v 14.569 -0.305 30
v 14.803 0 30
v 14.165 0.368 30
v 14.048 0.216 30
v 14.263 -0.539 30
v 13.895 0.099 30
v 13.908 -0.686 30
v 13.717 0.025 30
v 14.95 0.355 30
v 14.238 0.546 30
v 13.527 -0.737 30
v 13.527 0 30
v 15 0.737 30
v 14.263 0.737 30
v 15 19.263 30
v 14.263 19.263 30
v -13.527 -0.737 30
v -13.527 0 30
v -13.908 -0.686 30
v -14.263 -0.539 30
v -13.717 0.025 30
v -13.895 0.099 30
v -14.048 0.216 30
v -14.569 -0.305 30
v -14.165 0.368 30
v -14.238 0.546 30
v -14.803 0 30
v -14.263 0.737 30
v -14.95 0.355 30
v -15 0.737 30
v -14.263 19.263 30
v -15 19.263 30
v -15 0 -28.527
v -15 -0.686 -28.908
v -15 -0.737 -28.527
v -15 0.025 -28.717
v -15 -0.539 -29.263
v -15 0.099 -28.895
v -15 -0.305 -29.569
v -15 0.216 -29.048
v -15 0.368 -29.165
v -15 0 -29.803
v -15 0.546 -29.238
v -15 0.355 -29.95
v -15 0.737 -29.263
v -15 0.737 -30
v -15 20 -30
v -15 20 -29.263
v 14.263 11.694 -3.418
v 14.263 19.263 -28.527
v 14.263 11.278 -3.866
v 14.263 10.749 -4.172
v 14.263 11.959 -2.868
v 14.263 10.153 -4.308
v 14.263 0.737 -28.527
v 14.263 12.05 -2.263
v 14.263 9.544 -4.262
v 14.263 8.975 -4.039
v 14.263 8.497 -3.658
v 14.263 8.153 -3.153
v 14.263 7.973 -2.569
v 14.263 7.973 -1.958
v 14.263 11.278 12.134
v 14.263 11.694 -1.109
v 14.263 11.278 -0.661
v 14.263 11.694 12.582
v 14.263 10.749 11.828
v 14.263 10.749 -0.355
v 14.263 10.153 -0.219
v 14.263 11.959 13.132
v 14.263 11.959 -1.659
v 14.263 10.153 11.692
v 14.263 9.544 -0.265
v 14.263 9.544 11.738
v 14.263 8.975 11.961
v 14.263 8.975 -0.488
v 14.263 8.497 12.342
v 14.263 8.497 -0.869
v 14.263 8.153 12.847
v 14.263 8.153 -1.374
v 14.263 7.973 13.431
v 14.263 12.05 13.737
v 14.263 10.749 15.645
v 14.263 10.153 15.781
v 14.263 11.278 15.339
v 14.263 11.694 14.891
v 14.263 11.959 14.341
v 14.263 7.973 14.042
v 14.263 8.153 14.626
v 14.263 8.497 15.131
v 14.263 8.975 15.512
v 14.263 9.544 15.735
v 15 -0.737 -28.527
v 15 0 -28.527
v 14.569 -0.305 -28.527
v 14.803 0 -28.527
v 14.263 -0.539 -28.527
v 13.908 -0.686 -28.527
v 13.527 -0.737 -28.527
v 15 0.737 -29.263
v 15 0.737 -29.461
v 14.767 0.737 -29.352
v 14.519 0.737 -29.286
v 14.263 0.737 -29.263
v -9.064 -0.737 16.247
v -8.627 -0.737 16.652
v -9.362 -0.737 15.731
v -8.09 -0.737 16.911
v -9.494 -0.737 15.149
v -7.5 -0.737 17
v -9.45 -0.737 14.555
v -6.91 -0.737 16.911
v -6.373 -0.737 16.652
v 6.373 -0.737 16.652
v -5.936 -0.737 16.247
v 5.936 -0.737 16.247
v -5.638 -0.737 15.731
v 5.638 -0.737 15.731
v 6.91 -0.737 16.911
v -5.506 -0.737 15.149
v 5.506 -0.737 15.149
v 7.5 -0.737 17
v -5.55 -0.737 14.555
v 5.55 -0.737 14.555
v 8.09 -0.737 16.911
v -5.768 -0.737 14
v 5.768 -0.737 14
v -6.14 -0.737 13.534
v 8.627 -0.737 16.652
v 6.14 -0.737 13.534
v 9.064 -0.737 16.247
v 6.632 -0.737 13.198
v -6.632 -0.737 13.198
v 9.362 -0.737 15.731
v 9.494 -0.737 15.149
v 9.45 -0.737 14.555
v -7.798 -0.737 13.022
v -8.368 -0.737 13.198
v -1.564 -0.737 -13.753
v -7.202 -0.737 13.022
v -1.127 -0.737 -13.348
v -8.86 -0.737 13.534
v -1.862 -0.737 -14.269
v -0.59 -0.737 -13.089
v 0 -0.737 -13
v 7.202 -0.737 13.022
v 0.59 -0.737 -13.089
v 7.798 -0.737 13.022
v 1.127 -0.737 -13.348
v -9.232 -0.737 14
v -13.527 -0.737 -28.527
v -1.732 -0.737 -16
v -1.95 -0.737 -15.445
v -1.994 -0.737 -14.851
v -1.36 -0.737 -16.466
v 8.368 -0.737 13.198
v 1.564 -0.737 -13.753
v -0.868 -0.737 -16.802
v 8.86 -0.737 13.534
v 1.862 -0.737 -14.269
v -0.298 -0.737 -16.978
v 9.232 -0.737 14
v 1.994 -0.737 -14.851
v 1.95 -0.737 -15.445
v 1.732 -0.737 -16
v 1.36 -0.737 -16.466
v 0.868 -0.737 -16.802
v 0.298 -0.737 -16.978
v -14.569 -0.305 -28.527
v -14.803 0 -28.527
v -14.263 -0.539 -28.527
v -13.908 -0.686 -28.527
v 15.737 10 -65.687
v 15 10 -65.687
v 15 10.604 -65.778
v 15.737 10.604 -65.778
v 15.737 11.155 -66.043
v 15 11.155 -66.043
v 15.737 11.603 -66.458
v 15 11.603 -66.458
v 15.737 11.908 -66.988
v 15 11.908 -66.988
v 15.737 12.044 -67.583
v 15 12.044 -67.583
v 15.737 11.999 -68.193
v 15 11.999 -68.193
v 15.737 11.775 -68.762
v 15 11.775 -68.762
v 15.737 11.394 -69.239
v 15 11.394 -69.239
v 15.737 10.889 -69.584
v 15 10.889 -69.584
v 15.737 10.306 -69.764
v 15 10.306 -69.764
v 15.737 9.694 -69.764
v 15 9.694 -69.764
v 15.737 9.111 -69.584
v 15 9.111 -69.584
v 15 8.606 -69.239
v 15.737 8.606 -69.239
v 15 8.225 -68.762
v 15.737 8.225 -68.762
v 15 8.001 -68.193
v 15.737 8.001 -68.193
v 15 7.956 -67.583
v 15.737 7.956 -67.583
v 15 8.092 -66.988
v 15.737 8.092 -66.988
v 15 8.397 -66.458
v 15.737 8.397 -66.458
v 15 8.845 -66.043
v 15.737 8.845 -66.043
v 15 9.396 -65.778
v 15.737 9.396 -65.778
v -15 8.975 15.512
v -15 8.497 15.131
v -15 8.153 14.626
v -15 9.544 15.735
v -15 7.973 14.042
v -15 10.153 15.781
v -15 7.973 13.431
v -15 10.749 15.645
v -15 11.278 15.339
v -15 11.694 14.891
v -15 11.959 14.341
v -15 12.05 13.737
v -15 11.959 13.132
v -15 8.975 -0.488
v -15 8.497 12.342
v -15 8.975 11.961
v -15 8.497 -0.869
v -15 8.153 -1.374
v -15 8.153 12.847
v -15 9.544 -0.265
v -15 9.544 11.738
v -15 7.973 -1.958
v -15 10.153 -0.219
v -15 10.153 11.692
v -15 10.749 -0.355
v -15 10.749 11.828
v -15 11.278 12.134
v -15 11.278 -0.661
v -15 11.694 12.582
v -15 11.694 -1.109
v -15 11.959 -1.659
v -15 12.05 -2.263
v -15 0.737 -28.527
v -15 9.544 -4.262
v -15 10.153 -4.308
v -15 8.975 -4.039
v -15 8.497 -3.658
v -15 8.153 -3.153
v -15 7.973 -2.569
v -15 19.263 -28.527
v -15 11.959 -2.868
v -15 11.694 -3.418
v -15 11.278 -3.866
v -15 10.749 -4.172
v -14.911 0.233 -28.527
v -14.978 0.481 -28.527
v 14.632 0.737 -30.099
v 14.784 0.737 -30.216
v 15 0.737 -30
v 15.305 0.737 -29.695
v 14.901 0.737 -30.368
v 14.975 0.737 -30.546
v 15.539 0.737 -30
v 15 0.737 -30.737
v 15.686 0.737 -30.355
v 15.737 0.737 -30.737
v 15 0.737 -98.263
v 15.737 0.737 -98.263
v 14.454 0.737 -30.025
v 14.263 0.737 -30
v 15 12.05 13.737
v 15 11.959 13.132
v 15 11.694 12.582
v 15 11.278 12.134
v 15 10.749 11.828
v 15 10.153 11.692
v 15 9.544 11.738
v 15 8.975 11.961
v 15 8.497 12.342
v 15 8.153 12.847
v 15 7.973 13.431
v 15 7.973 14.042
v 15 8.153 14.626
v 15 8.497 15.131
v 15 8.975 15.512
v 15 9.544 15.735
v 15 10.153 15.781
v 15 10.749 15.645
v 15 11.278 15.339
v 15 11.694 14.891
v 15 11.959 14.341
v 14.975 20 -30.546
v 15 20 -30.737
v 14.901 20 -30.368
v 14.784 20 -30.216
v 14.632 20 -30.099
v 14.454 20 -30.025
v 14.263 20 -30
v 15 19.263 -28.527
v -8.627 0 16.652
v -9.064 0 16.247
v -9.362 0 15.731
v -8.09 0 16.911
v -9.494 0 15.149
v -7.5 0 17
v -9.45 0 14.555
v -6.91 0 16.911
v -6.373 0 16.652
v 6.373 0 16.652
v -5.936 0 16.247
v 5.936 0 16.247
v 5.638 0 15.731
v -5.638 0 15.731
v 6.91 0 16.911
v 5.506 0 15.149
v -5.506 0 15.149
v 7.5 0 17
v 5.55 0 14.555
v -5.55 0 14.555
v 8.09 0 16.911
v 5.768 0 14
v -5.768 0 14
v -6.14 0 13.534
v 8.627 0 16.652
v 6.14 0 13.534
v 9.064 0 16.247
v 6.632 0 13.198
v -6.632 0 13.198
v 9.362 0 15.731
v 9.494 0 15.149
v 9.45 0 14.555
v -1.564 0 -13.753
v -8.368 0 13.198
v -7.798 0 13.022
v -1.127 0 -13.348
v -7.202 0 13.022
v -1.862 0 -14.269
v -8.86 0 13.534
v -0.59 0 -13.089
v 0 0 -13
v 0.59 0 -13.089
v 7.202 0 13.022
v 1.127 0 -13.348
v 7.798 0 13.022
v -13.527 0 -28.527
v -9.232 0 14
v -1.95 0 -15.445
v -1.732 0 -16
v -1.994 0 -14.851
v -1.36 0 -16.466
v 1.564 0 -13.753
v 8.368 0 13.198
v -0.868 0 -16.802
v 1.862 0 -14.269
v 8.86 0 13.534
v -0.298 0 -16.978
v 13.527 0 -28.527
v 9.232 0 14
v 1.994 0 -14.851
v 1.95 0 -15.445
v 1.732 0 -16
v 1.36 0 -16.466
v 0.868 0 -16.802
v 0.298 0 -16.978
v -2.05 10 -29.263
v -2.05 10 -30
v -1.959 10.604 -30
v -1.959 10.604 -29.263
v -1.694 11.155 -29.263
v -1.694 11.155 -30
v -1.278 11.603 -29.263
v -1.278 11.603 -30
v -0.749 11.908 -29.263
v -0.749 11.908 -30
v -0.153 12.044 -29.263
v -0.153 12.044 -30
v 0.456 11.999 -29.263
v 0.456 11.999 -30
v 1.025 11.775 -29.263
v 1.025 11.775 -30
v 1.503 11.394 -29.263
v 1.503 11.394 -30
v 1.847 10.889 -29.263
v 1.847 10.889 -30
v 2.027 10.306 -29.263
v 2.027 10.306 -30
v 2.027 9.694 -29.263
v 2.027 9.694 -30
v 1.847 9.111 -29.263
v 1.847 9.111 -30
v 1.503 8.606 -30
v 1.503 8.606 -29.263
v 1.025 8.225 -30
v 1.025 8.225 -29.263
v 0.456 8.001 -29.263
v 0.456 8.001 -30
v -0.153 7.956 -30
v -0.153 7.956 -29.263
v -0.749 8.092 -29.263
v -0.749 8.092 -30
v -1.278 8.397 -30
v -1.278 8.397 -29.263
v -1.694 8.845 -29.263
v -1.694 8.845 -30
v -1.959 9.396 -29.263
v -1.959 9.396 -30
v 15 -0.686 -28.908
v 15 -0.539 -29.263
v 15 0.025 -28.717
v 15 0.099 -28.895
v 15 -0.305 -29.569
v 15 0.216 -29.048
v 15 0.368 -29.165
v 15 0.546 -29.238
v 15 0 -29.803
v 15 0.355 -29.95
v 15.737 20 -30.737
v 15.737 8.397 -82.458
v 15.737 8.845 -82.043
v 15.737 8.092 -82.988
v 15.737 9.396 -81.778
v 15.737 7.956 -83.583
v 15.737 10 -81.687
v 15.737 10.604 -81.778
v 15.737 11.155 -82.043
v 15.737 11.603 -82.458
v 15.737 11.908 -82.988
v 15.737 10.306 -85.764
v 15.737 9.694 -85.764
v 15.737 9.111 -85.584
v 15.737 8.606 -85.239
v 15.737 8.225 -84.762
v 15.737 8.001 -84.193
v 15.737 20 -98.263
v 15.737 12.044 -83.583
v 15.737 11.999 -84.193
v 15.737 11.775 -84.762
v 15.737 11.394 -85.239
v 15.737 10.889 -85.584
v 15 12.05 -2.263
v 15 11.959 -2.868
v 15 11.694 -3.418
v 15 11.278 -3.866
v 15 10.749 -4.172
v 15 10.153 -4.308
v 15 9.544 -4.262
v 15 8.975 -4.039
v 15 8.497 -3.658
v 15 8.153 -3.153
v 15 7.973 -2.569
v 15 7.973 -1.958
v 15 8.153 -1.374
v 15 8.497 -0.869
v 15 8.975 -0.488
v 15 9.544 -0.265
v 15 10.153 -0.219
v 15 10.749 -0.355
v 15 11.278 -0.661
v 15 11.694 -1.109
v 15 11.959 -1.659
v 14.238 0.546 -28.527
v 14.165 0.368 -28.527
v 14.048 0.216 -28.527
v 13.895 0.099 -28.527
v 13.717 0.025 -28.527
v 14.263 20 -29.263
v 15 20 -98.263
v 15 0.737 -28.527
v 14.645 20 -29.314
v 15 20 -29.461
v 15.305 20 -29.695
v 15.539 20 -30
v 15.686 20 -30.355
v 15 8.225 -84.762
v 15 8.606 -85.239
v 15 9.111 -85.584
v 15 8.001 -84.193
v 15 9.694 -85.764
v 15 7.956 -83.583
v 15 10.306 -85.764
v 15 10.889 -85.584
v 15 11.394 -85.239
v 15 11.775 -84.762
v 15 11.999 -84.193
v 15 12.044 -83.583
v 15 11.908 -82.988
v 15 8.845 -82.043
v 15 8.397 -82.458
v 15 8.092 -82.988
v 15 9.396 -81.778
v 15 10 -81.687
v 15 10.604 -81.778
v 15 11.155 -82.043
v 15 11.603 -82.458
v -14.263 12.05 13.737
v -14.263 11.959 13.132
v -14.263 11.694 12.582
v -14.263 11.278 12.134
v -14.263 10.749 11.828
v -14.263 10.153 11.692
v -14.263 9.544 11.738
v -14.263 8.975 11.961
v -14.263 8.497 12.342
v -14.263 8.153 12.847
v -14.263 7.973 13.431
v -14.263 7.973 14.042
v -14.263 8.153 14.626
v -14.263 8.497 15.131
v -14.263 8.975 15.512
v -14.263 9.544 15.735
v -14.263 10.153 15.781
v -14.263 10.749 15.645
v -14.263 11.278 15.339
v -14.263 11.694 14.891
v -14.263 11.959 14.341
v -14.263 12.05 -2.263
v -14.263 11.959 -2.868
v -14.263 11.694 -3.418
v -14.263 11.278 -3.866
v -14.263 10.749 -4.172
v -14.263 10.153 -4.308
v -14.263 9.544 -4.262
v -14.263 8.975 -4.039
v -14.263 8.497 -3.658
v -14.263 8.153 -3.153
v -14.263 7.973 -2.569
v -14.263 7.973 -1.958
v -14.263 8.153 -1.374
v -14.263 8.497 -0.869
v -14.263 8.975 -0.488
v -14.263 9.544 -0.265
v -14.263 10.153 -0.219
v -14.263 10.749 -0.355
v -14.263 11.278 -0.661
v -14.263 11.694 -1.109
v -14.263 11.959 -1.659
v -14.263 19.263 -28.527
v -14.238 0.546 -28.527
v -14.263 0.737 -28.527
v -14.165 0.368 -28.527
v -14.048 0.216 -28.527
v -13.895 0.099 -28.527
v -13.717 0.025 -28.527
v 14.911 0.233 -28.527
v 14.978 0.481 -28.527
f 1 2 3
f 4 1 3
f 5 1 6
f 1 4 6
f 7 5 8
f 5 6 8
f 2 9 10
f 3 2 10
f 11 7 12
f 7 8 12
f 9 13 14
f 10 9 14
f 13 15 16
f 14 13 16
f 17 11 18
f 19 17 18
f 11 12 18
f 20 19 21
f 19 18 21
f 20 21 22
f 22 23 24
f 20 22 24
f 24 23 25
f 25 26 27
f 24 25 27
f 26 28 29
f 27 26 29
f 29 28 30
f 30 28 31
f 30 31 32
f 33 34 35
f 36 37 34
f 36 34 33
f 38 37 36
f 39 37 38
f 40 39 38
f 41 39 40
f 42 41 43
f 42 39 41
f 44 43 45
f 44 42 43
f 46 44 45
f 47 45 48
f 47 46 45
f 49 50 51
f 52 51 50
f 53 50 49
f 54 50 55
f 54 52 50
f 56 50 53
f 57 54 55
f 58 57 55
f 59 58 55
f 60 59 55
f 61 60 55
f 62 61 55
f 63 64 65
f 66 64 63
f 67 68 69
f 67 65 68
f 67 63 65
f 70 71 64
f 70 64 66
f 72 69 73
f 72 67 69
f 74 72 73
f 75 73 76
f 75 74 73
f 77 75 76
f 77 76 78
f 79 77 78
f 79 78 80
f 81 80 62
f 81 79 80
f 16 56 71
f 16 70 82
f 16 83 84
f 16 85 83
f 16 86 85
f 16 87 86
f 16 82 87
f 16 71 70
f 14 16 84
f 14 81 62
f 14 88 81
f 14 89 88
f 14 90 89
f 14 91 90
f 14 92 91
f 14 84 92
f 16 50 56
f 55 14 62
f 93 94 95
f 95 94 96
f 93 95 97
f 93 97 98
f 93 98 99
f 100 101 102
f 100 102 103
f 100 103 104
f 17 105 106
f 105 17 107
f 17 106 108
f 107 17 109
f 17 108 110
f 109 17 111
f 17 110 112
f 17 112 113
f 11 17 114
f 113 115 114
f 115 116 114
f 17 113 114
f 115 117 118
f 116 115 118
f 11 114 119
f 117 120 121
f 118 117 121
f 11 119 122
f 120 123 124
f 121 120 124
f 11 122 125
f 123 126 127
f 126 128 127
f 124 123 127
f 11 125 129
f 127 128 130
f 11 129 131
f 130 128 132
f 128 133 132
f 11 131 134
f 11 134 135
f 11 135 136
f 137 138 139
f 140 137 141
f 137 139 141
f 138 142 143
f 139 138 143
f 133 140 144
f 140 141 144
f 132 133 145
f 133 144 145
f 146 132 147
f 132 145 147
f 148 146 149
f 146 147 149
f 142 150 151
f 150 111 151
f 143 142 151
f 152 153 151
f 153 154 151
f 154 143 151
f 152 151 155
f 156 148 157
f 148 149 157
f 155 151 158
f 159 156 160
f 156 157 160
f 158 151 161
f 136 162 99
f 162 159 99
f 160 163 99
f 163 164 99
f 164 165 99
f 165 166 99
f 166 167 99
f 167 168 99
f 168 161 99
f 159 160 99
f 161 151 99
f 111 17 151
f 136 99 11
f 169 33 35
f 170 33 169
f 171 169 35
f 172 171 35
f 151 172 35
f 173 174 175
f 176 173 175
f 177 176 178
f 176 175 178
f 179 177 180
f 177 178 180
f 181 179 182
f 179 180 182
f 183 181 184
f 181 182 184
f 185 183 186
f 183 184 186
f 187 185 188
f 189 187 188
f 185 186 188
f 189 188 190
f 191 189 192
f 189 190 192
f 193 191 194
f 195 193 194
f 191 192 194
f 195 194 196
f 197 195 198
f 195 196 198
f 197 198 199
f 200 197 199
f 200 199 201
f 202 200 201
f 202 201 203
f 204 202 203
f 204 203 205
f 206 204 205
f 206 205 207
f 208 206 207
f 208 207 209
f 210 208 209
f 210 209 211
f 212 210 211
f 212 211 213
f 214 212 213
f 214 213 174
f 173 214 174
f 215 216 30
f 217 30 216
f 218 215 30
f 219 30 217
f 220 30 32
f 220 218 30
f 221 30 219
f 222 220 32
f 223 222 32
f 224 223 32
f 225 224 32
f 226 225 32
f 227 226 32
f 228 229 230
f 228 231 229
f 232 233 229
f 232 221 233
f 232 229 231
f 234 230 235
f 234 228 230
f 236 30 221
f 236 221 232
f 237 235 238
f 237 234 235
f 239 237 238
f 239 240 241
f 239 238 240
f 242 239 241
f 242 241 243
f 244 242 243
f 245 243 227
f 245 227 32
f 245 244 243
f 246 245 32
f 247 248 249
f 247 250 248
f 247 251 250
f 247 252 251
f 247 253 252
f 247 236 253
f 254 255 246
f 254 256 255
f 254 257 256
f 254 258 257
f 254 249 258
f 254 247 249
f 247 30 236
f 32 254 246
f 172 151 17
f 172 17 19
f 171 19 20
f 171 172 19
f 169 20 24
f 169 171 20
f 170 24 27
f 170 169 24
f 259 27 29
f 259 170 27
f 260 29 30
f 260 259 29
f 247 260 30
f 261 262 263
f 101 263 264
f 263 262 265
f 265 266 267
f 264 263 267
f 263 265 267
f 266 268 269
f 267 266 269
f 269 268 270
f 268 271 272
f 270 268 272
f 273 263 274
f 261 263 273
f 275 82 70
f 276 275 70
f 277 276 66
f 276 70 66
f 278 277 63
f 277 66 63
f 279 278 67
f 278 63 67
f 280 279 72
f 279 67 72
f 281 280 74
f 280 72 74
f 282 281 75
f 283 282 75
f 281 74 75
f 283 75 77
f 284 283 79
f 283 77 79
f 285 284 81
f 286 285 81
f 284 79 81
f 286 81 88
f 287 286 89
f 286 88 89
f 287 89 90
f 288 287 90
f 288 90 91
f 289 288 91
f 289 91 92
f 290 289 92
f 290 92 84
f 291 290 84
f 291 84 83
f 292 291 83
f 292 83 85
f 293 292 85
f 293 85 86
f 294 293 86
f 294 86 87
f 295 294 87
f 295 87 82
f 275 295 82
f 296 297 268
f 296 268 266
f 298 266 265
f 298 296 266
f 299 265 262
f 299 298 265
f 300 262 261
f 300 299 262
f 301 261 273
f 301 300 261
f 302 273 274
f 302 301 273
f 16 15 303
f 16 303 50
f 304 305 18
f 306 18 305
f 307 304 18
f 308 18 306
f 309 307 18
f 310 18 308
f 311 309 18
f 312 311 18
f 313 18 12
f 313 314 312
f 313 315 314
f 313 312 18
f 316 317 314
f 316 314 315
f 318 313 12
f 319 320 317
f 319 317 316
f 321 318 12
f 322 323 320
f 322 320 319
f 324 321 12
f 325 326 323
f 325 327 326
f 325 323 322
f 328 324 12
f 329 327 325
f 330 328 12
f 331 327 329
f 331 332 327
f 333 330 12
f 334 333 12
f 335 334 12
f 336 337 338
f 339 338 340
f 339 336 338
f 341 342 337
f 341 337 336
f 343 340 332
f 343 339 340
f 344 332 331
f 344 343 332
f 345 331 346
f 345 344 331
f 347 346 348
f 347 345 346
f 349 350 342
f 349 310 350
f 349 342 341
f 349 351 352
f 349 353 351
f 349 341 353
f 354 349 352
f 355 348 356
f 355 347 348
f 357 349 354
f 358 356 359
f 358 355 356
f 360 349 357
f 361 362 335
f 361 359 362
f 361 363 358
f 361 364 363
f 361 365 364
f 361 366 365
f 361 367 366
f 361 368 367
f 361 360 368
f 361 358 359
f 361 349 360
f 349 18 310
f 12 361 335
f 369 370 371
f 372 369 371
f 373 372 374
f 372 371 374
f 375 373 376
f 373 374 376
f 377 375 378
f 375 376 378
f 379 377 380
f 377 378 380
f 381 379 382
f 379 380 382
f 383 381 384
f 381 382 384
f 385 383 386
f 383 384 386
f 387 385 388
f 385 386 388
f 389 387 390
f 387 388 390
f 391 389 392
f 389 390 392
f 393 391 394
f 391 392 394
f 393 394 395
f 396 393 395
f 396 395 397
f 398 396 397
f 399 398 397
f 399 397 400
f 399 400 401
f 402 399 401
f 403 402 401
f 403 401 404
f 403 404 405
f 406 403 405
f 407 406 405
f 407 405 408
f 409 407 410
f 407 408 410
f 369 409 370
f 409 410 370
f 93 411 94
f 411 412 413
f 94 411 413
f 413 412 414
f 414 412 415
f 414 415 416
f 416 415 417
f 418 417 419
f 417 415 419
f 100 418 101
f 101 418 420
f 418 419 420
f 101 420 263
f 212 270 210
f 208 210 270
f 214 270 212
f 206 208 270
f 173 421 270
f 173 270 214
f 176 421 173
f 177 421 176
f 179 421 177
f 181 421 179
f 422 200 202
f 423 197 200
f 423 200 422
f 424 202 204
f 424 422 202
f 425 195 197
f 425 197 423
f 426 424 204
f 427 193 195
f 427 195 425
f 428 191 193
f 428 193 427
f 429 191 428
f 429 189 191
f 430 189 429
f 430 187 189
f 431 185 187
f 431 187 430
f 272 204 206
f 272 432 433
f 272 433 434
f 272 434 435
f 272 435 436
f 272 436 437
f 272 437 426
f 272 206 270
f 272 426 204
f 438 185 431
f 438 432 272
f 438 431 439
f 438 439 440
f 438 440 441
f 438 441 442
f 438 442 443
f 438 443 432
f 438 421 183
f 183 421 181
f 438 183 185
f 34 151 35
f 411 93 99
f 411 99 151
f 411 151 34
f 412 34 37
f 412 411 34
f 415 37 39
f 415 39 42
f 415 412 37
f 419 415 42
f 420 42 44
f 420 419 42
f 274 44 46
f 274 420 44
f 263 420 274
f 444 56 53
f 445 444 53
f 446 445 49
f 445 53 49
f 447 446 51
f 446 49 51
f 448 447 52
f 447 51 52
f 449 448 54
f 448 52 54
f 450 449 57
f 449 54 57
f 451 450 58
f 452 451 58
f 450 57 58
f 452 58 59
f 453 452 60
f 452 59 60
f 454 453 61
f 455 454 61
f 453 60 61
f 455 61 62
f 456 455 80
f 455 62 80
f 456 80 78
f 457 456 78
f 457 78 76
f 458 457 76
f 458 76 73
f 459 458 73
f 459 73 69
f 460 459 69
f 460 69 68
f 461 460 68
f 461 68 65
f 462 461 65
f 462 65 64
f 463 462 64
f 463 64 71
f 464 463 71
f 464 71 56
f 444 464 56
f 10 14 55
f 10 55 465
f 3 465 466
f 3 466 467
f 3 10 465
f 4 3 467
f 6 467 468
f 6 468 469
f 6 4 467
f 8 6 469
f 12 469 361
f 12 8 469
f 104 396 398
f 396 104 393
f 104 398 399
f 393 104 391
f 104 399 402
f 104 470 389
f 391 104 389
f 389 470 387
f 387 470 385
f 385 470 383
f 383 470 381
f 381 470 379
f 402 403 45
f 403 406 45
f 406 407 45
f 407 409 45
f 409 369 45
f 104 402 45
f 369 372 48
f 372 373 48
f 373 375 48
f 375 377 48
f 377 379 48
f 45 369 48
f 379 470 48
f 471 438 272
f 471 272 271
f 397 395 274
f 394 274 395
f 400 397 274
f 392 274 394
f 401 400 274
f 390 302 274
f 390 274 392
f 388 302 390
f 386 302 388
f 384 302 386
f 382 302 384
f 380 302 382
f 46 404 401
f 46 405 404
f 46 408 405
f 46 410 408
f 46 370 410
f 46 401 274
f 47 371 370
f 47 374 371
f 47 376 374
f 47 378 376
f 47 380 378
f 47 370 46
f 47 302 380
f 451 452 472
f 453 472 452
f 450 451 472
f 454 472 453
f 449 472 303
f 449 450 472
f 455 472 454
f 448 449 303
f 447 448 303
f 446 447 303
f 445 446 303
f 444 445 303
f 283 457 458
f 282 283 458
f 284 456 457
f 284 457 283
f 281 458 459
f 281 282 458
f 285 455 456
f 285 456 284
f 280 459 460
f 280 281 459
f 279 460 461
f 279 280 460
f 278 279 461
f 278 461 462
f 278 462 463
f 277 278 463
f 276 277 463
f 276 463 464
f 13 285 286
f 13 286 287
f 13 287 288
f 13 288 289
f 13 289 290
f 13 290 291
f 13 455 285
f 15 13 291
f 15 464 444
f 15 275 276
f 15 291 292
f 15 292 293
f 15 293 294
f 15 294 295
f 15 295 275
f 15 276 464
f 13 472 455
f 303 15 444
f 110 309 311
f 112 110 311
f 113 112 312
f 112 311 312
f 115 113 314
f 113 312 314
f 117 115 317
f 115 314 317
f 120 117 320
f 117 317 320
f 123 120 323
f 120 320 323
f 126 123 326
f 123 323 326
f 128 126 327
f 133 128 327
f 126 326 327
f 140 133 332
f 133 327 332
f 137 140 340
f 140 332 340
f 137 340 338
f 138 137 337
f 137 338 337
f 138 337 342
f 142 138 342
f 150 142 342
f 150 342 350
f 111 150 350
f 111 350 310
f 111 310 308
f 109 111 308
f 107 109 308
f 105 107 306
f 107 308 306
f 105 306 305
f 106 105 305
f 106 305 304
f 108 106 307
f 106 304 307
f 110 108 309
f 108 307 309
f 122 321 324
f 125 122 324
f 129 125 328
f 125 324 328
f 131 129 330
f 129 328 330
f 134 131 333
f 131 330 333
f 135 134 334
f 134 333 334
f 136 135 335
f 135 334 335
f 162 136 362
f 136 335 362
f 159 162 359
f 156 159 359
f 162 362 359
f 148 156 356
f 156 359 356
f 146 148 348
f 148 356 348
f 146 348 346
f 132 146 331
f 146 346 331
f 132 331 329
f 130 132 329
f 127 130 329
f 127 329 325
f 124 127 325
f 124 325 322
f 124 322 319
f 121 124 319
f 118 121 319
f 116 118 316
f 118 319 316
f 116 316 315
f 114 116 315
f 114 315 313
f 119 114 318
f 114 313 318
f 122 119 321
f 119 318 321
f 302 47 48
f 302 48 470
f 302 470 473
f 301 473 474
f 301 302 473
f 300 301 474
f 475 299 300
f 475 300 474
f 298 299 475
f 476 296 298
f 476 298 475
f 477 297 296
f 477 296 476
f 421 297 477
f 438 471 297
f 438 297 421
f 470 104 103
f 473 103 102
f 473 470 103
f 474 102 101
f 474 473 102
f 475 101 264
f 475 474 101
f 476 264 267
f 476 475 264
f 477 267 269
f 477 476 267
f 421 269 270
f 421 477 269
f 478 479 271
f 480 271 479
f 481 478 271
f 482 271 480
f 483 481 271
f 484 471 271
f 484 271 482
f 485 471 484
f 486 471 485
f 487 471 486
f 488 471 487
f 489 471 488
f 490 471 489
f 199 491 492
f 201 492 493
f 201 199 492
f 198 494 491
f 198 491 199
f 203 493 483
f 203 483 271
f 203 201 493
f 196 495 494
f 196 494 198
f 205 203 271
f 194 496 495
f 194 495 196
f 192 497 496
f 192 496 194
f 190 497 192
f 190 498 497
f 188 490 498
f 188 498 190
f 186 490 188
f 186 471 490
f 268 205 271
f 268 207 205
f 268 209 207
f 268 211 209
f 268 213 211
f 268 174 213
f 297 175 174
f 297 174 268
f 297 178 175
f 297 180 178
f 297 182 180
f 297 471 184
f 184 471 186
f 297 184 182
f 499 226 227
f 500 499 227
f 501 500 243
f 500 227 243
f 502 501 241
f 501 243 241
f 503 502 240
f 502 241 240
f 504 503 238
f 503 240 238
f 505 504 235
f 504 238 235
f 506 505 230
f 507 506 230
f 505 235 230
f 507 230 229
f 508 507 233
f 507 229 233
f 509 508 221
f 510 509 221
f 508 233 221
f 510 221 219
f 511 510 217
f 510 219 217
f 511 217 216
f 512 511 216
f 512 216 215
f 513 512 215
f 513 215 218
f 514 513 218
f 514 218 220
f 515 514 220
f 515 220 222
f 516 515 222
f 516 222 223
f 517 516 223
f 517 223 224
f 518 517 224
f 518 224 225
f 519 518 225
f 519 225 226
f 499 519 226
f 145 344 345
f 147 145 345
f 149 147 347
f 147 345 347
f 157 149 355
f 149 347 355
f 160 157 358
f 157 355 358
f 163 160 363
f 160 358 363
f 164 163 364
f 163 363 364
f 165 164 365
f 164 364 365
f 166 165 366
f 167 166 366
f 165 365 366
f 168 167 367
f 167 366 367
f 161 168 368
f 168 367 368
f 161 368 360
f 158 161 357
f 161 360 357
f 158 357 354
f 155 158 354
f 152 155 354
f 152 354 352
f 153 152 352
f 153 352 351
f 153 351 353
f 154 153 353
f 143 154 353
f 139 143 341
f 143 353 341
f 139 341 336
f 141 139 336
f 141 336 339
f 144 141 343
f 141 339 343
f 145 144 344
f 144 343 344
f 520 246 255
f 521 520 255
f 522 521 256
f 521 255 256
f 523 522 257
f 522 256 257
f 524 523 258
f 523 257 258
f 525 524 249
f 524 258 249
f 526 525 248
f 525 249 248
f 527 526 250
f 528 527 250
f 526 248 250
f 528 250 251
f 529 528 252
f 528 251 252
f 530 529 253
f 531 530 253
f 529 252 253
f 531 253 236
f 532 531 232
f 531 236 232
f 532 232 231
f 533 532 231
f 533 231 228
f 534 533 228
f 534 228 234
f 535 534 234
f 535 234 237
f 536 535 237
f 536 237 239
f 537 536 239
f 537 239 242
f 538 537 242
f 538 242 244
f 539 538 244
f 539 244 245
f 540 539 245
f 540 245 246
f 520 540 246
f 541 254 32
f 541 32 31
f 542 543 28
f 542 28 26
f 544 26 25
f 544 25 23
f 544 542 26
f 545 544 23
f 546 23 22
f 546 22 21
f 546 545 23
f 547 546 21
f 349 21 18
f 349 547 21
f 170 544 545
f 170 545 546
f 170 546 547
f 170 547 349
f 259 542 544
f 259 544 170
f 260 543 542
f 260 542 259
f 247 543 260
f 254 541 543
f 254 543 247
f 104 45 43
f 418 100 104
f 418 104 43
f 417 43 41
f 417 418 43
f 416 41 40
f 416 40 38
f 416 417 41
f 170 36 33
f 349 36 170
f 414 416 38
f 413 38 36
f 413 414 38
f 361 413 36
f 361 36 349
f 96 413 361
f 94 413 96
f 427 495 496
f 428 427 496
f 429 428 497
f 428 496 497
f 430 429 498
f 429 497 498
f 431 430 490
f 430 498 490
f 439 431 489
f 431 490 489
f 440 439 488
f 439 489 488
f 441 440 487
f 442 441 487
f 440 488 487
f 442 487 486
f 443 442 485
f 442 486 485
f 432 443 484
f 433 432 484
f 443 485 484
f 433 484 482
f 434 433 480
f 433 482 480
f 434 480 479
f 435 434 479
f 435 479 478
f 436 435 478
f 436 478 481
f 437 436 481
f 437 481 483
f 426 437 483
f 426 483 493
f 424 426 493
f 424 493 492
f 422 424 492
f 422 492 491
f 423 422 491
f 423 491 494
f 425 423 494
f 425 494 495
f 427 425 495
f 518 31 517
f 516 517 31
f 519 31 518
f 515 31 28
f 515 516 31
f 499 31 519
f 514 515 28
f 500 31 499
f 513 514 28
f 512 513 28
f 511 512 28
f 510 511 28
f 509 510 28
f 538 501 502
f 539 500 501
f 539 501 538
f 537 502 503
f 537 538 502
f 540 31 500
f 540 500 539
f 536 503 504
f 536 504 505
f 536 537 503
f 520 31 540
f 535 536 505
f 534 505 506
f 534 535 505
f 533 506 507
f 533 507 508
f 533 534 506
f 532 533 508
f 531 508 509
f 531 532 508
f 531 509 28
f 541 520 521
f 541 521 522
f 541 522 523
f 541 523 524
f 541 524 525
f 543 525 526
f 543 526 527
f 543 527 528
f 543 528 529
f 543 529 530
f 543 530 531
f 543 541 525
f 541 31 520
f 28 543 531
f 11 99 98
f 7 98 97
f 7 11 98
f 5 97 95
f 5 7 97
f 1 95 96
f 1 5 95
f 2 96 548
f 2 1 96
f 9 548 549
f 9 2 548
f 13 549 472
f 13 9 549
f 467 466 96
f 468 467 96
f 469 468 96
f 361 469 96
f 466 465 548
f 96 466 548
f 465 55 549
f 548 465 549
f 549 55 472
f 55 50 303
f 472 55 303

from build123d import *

# Parameters (mm, degrees)
SKETCH1_W                    = 30
SKETCH1_H                    = 60
SKETCH1_R                    = 2
BASE_FLANGE1_DEPTH           = 0.7366
EDGE_FLANGE1_STRIP_W         = 4.4196
EDGE_FLANGE1_STRIP_H         = 0.7366
EDGE_FLANGE1_STRIP_CUT_DEPTH = 30
EDGE_FLANGE1_DEPTH           = 30
EDGE_FLANGE1_PROFILE_W       = 30
EDGE_FLANGE1_PROFILE_H       = 19.2634
EDGE_FLANGE1_PROFILE_R       = 2.05
EDGE_FLANGE1_FLAT_DEPTH      = 0.7366
EDGE_FLANGE2_STRIP_W         = 4.4196
EDGE_FLANGE2_STRIP_H         = 0.7366
EDGE_FLANGE2_STRIP_CUT_DEPTH = 58.5268
EDGE_FLANGE2_DEPTH           = 58.5268
EDGE_FLANGE3_STRIP_W         = 4.4196
EDGE_FLANGE3_STRIP_H         = 0.7366
EDGE_FLANGE3_STRIP_CUT_DEPTH = 58.5268
EDGE_FLANGE3_DEPTH           = 58.5268
EDGE_FLANGE4_STRIP_W         = 4.4196
EDGE_FLANGE4_STRIP_H         = 0.7366
EDGE_FLANGE4_STRIP_CUT_DEPTH = 19.2634
EDGE_FLANGE4_DEPTH           = 19.2634
SKETCH18_R                   = 2.05
CUT_EXTRUDE1_DEPTH           = 409.590672417


# Sheet-metal steps are written as plain solids
with BuildPart() as part:
    # Sketch1 → Base-Flange1 (new body)
    with BuildSketch(Plane(origin=(0, 0, 0), x_dir=(1, 0, 0), z_dir=(0, 1, 0))):
        Rectangle(SKETCH1_W, SKETCH1_H)
        with Locations(Location((7.5, -15, 0), (0, 0, 270))):
            Circle(SKETCH1_R, mode=Mode.SUBTRACT)
        with Locations(Location((0, 15, 0), (0, 0, 270))):
            Circle(SKETCH1_R, mode=Mode.SUBTRACT)
        with Locations(Location((-7.5, -15, 0), (0, 0, 270))):
            Circle(SKETCH1_R, mode=Mode.SUBTRACT)
    extrude(amount=-BASE_FLANGE1_DEPTH)

    # Edge-Flange1 strip (across the edge) → Edge-Flange1 strip cut (cut)
    with BuildSketch(Plane(origin=(15, 0, -30), x_dir=(0, 0, 1), z_dir=(-1, 0, 0))):
        with Locations((-0.7366, -0.3683)):
            Rectangle(EDGE_FLANGE1_STRIP_W, EDGE_FLANGE1_STRIP_H)
    extrude(amount=EDGE_FLANGE1_STRIP_CUT_DEPTH, mode=Mode.SUBTRACT)

    # Edge-Flange1 bend section (across the edge) → Edge-Flange1 (add)
    with BuildSketch(Plane(origin=(15, 0, -30), x_dir=(0, 0, 1), z_dir=(-1, 0, 0))):
        with BuildLine():
            Line((0, 0.7366), (0.7366, 0.7366))
            ThreePointArc((0.7366, 0.7366), (0.952345145, 0.215745145), (1.4732, 0))
            Line((1.4732, 0), (1.4732, -0.7366))
            ThreePointArc((1.4732, -0.7366), (0.43149029, -0.30510971), (0, 0.7366))
        make_face()
    extrude(amount=EDGE_FLANGE1_DEPTH)

    # Edge-Flange1 profile (on flange) → Edge-Flange1 flat (add)
    with BuildSketch(Plane(origin=(0, 0, -30), x_dir=(-1, 0, 0), z_dir=(0, 0, -1))):
        with Locations((0, 10.3683)):
            Rectangle(EDGE_FLANGE1_PROFILE_W, EDGE_FLANGE1_PROFILE_H)
        with Locations((0, 10)):
            Circle(EDGE_FLANGE1_PROFILE_R, mode=Mode.SUBTRACT)
    extrude(amount=-EDGE_FLANGE1_FLAT_DEPTH)

    # Edge-Flange2 strip (across the edge) → Edge-Flange2 strip cut (cut)
    with BuildSketch(Plane(origin=(15, 0, 30), x_dir=(-1, 0, 0), z_dir=(0, 0, -1))):
        with Locations((-0.7366, -0.3683)):
            Rectangle(EDGE_FLANGE2_STRIP_W, EDGE_FLANGE2_STRIP_H)
    extrude(amount=EDGE_FLANGE2_STRIP_CUT_DEPTH, mode=Mode.SUBTRACT)

    # Edge-Flange2 section (across the edge) → Edge-Flange2 (add)
    with BuildSketch(Plane(origin=(15, 0, 30), x_dir=(-1, 0, 0), z_dir=(0, 0, -1))):
        with BuildLine():
            Line((0, 0.7366), (0, 19.2634))
            Line((0, 19.2634), (0.7366, 19.2634))
            Line((0.7366, 19.2634), (0.7366, 0.7366))
            ThreePointArc((0.7366, 0.7366), (0.952345145, 0.215745145), (1.4732, 0))
            Line((1.4732, 0), (1.4732, -0.7366))
            ThreePointArc((1.4732, -0.7366), (0.43149029, -0.30510971), (0, 0.7366))
        make_face()
    extrude(amount=EDGE_FLANGE2_DEPTH)

    # Edge-Flange3 strip (across the edge) → Edge-Flange3 strip cut (cut)
    with BuildSketch(Plane(origin=(-15, 0, -28.5268), x_dir=(1, 0, 0), z_dir=(0, 0, 1))):
        with Locations((-0.7366, -0.3683)):
            Rectangle(EDGE_FLANGE3_STRIP_W, EDGE_FLANGE3_STRIP_H)
    extrude(amount=EDGE_FLANGE3_STRIP_CUT_DEPTH, mode=Mode.SUBTRACT)

    # Edge-Flange3 section (across the edge) → Edge-Flange3 (add)
    with BuildSketch(Plane(origin=(-15, 0, -28.5268), x_dir=(1, 0, 0), z_dir=(0, 0, 1))):
        with BuildLine():
            Line((0, 0.7366), (0, 19.2634))
            Line((0, 19.2634), (0.7366, 19.2634))
            Line((0.7366, 19.2634), (0.7366, 0.7366))
            ThreePointArc((0.7366, 0.7366), (0.952345145, 0.215745145), (1.4732, 0))
            Line((1.4732, 0), (1.4732, -0.7366))
            ThreePointArc((1.4732, -0.7366), (0.43149029, -0.30510971), (0, 0.7366))
        make_face()
    extrude(amount=EDGE_FLANGE3_DEPTH)

    # Edge-Flange4 strip (across the edge) → Edge-Flange4 strip cut (cut)
    with BuildSketch(Plane(origin=(15, 20, -30), x_dir=(-1, 0, 0), z_dir=(0, -1, 0))):
        with Locations((-1.4732, -0.3683)):
            Rectangle(EDGE_FLANGE4_STRIP_W, EDGE_FLANGE4_STRIP_H)
    extrude(amount=EDGE_FLANGE4_STRIP_CUT_DEPTH, mode=Mode.SUBTRACT)

    # Edge-Flange4 section (across the edge) → Edge-Flange4 (add)
    with BuildSketch(Plane(origin=(15, 20, -30), x_dir=(-1, 0, 0), z_dir=(0, -1, 0))):
        with BuildLine():
            Line((-0.7366, 0.7366), (-0.7366, 68.2634))
            Line((-0.7366, 68.2634), (0, 68.2634))
            Line((0, 68.2634), (0, 0.7366))
            ThreePointArc((0, 0.7366), (0.215745145, 0.215745145), (0.7366, 0))
            Line((0.7366, 0), (0.7366, -0.7366))
            ThreePointArc((0.7366, -0.7366), (-0.30510971, -0.30510971), (-0.7366, 0.7366))
        make_face()
    extrude(amount=EDGE_FLANGE4_DEPTH)

    # Sketch18 → Cut-Extrude1 (cut, through all)
    with BuildSketch(Plane(origin=(-385, -11.740421973, -25.126127563), x_dir=(0, 0, 1), z_dir=(-1, 0, 0))):
        with Locations((-42.610472437, 21.740421973)):
            Circle(SKETCH18_R)
        with Locations((-58.610472437, 21.740421973)):
            Circle(SKETCH18_R)
        with Locations(Location((22.862727563, 21.740421973, 0), (0, 0, 90))):
            Circle(SKETCH18_R)
        with Locations(Location((38.862727563, 21.740421973, 0), (0, 0, 90))):
            Circle(SKETCH18_R)
    extrude(amount=-CUT_EXTRUDE1_DEPTH, mode=Mode.SUBTRACT)


solid = part.part
